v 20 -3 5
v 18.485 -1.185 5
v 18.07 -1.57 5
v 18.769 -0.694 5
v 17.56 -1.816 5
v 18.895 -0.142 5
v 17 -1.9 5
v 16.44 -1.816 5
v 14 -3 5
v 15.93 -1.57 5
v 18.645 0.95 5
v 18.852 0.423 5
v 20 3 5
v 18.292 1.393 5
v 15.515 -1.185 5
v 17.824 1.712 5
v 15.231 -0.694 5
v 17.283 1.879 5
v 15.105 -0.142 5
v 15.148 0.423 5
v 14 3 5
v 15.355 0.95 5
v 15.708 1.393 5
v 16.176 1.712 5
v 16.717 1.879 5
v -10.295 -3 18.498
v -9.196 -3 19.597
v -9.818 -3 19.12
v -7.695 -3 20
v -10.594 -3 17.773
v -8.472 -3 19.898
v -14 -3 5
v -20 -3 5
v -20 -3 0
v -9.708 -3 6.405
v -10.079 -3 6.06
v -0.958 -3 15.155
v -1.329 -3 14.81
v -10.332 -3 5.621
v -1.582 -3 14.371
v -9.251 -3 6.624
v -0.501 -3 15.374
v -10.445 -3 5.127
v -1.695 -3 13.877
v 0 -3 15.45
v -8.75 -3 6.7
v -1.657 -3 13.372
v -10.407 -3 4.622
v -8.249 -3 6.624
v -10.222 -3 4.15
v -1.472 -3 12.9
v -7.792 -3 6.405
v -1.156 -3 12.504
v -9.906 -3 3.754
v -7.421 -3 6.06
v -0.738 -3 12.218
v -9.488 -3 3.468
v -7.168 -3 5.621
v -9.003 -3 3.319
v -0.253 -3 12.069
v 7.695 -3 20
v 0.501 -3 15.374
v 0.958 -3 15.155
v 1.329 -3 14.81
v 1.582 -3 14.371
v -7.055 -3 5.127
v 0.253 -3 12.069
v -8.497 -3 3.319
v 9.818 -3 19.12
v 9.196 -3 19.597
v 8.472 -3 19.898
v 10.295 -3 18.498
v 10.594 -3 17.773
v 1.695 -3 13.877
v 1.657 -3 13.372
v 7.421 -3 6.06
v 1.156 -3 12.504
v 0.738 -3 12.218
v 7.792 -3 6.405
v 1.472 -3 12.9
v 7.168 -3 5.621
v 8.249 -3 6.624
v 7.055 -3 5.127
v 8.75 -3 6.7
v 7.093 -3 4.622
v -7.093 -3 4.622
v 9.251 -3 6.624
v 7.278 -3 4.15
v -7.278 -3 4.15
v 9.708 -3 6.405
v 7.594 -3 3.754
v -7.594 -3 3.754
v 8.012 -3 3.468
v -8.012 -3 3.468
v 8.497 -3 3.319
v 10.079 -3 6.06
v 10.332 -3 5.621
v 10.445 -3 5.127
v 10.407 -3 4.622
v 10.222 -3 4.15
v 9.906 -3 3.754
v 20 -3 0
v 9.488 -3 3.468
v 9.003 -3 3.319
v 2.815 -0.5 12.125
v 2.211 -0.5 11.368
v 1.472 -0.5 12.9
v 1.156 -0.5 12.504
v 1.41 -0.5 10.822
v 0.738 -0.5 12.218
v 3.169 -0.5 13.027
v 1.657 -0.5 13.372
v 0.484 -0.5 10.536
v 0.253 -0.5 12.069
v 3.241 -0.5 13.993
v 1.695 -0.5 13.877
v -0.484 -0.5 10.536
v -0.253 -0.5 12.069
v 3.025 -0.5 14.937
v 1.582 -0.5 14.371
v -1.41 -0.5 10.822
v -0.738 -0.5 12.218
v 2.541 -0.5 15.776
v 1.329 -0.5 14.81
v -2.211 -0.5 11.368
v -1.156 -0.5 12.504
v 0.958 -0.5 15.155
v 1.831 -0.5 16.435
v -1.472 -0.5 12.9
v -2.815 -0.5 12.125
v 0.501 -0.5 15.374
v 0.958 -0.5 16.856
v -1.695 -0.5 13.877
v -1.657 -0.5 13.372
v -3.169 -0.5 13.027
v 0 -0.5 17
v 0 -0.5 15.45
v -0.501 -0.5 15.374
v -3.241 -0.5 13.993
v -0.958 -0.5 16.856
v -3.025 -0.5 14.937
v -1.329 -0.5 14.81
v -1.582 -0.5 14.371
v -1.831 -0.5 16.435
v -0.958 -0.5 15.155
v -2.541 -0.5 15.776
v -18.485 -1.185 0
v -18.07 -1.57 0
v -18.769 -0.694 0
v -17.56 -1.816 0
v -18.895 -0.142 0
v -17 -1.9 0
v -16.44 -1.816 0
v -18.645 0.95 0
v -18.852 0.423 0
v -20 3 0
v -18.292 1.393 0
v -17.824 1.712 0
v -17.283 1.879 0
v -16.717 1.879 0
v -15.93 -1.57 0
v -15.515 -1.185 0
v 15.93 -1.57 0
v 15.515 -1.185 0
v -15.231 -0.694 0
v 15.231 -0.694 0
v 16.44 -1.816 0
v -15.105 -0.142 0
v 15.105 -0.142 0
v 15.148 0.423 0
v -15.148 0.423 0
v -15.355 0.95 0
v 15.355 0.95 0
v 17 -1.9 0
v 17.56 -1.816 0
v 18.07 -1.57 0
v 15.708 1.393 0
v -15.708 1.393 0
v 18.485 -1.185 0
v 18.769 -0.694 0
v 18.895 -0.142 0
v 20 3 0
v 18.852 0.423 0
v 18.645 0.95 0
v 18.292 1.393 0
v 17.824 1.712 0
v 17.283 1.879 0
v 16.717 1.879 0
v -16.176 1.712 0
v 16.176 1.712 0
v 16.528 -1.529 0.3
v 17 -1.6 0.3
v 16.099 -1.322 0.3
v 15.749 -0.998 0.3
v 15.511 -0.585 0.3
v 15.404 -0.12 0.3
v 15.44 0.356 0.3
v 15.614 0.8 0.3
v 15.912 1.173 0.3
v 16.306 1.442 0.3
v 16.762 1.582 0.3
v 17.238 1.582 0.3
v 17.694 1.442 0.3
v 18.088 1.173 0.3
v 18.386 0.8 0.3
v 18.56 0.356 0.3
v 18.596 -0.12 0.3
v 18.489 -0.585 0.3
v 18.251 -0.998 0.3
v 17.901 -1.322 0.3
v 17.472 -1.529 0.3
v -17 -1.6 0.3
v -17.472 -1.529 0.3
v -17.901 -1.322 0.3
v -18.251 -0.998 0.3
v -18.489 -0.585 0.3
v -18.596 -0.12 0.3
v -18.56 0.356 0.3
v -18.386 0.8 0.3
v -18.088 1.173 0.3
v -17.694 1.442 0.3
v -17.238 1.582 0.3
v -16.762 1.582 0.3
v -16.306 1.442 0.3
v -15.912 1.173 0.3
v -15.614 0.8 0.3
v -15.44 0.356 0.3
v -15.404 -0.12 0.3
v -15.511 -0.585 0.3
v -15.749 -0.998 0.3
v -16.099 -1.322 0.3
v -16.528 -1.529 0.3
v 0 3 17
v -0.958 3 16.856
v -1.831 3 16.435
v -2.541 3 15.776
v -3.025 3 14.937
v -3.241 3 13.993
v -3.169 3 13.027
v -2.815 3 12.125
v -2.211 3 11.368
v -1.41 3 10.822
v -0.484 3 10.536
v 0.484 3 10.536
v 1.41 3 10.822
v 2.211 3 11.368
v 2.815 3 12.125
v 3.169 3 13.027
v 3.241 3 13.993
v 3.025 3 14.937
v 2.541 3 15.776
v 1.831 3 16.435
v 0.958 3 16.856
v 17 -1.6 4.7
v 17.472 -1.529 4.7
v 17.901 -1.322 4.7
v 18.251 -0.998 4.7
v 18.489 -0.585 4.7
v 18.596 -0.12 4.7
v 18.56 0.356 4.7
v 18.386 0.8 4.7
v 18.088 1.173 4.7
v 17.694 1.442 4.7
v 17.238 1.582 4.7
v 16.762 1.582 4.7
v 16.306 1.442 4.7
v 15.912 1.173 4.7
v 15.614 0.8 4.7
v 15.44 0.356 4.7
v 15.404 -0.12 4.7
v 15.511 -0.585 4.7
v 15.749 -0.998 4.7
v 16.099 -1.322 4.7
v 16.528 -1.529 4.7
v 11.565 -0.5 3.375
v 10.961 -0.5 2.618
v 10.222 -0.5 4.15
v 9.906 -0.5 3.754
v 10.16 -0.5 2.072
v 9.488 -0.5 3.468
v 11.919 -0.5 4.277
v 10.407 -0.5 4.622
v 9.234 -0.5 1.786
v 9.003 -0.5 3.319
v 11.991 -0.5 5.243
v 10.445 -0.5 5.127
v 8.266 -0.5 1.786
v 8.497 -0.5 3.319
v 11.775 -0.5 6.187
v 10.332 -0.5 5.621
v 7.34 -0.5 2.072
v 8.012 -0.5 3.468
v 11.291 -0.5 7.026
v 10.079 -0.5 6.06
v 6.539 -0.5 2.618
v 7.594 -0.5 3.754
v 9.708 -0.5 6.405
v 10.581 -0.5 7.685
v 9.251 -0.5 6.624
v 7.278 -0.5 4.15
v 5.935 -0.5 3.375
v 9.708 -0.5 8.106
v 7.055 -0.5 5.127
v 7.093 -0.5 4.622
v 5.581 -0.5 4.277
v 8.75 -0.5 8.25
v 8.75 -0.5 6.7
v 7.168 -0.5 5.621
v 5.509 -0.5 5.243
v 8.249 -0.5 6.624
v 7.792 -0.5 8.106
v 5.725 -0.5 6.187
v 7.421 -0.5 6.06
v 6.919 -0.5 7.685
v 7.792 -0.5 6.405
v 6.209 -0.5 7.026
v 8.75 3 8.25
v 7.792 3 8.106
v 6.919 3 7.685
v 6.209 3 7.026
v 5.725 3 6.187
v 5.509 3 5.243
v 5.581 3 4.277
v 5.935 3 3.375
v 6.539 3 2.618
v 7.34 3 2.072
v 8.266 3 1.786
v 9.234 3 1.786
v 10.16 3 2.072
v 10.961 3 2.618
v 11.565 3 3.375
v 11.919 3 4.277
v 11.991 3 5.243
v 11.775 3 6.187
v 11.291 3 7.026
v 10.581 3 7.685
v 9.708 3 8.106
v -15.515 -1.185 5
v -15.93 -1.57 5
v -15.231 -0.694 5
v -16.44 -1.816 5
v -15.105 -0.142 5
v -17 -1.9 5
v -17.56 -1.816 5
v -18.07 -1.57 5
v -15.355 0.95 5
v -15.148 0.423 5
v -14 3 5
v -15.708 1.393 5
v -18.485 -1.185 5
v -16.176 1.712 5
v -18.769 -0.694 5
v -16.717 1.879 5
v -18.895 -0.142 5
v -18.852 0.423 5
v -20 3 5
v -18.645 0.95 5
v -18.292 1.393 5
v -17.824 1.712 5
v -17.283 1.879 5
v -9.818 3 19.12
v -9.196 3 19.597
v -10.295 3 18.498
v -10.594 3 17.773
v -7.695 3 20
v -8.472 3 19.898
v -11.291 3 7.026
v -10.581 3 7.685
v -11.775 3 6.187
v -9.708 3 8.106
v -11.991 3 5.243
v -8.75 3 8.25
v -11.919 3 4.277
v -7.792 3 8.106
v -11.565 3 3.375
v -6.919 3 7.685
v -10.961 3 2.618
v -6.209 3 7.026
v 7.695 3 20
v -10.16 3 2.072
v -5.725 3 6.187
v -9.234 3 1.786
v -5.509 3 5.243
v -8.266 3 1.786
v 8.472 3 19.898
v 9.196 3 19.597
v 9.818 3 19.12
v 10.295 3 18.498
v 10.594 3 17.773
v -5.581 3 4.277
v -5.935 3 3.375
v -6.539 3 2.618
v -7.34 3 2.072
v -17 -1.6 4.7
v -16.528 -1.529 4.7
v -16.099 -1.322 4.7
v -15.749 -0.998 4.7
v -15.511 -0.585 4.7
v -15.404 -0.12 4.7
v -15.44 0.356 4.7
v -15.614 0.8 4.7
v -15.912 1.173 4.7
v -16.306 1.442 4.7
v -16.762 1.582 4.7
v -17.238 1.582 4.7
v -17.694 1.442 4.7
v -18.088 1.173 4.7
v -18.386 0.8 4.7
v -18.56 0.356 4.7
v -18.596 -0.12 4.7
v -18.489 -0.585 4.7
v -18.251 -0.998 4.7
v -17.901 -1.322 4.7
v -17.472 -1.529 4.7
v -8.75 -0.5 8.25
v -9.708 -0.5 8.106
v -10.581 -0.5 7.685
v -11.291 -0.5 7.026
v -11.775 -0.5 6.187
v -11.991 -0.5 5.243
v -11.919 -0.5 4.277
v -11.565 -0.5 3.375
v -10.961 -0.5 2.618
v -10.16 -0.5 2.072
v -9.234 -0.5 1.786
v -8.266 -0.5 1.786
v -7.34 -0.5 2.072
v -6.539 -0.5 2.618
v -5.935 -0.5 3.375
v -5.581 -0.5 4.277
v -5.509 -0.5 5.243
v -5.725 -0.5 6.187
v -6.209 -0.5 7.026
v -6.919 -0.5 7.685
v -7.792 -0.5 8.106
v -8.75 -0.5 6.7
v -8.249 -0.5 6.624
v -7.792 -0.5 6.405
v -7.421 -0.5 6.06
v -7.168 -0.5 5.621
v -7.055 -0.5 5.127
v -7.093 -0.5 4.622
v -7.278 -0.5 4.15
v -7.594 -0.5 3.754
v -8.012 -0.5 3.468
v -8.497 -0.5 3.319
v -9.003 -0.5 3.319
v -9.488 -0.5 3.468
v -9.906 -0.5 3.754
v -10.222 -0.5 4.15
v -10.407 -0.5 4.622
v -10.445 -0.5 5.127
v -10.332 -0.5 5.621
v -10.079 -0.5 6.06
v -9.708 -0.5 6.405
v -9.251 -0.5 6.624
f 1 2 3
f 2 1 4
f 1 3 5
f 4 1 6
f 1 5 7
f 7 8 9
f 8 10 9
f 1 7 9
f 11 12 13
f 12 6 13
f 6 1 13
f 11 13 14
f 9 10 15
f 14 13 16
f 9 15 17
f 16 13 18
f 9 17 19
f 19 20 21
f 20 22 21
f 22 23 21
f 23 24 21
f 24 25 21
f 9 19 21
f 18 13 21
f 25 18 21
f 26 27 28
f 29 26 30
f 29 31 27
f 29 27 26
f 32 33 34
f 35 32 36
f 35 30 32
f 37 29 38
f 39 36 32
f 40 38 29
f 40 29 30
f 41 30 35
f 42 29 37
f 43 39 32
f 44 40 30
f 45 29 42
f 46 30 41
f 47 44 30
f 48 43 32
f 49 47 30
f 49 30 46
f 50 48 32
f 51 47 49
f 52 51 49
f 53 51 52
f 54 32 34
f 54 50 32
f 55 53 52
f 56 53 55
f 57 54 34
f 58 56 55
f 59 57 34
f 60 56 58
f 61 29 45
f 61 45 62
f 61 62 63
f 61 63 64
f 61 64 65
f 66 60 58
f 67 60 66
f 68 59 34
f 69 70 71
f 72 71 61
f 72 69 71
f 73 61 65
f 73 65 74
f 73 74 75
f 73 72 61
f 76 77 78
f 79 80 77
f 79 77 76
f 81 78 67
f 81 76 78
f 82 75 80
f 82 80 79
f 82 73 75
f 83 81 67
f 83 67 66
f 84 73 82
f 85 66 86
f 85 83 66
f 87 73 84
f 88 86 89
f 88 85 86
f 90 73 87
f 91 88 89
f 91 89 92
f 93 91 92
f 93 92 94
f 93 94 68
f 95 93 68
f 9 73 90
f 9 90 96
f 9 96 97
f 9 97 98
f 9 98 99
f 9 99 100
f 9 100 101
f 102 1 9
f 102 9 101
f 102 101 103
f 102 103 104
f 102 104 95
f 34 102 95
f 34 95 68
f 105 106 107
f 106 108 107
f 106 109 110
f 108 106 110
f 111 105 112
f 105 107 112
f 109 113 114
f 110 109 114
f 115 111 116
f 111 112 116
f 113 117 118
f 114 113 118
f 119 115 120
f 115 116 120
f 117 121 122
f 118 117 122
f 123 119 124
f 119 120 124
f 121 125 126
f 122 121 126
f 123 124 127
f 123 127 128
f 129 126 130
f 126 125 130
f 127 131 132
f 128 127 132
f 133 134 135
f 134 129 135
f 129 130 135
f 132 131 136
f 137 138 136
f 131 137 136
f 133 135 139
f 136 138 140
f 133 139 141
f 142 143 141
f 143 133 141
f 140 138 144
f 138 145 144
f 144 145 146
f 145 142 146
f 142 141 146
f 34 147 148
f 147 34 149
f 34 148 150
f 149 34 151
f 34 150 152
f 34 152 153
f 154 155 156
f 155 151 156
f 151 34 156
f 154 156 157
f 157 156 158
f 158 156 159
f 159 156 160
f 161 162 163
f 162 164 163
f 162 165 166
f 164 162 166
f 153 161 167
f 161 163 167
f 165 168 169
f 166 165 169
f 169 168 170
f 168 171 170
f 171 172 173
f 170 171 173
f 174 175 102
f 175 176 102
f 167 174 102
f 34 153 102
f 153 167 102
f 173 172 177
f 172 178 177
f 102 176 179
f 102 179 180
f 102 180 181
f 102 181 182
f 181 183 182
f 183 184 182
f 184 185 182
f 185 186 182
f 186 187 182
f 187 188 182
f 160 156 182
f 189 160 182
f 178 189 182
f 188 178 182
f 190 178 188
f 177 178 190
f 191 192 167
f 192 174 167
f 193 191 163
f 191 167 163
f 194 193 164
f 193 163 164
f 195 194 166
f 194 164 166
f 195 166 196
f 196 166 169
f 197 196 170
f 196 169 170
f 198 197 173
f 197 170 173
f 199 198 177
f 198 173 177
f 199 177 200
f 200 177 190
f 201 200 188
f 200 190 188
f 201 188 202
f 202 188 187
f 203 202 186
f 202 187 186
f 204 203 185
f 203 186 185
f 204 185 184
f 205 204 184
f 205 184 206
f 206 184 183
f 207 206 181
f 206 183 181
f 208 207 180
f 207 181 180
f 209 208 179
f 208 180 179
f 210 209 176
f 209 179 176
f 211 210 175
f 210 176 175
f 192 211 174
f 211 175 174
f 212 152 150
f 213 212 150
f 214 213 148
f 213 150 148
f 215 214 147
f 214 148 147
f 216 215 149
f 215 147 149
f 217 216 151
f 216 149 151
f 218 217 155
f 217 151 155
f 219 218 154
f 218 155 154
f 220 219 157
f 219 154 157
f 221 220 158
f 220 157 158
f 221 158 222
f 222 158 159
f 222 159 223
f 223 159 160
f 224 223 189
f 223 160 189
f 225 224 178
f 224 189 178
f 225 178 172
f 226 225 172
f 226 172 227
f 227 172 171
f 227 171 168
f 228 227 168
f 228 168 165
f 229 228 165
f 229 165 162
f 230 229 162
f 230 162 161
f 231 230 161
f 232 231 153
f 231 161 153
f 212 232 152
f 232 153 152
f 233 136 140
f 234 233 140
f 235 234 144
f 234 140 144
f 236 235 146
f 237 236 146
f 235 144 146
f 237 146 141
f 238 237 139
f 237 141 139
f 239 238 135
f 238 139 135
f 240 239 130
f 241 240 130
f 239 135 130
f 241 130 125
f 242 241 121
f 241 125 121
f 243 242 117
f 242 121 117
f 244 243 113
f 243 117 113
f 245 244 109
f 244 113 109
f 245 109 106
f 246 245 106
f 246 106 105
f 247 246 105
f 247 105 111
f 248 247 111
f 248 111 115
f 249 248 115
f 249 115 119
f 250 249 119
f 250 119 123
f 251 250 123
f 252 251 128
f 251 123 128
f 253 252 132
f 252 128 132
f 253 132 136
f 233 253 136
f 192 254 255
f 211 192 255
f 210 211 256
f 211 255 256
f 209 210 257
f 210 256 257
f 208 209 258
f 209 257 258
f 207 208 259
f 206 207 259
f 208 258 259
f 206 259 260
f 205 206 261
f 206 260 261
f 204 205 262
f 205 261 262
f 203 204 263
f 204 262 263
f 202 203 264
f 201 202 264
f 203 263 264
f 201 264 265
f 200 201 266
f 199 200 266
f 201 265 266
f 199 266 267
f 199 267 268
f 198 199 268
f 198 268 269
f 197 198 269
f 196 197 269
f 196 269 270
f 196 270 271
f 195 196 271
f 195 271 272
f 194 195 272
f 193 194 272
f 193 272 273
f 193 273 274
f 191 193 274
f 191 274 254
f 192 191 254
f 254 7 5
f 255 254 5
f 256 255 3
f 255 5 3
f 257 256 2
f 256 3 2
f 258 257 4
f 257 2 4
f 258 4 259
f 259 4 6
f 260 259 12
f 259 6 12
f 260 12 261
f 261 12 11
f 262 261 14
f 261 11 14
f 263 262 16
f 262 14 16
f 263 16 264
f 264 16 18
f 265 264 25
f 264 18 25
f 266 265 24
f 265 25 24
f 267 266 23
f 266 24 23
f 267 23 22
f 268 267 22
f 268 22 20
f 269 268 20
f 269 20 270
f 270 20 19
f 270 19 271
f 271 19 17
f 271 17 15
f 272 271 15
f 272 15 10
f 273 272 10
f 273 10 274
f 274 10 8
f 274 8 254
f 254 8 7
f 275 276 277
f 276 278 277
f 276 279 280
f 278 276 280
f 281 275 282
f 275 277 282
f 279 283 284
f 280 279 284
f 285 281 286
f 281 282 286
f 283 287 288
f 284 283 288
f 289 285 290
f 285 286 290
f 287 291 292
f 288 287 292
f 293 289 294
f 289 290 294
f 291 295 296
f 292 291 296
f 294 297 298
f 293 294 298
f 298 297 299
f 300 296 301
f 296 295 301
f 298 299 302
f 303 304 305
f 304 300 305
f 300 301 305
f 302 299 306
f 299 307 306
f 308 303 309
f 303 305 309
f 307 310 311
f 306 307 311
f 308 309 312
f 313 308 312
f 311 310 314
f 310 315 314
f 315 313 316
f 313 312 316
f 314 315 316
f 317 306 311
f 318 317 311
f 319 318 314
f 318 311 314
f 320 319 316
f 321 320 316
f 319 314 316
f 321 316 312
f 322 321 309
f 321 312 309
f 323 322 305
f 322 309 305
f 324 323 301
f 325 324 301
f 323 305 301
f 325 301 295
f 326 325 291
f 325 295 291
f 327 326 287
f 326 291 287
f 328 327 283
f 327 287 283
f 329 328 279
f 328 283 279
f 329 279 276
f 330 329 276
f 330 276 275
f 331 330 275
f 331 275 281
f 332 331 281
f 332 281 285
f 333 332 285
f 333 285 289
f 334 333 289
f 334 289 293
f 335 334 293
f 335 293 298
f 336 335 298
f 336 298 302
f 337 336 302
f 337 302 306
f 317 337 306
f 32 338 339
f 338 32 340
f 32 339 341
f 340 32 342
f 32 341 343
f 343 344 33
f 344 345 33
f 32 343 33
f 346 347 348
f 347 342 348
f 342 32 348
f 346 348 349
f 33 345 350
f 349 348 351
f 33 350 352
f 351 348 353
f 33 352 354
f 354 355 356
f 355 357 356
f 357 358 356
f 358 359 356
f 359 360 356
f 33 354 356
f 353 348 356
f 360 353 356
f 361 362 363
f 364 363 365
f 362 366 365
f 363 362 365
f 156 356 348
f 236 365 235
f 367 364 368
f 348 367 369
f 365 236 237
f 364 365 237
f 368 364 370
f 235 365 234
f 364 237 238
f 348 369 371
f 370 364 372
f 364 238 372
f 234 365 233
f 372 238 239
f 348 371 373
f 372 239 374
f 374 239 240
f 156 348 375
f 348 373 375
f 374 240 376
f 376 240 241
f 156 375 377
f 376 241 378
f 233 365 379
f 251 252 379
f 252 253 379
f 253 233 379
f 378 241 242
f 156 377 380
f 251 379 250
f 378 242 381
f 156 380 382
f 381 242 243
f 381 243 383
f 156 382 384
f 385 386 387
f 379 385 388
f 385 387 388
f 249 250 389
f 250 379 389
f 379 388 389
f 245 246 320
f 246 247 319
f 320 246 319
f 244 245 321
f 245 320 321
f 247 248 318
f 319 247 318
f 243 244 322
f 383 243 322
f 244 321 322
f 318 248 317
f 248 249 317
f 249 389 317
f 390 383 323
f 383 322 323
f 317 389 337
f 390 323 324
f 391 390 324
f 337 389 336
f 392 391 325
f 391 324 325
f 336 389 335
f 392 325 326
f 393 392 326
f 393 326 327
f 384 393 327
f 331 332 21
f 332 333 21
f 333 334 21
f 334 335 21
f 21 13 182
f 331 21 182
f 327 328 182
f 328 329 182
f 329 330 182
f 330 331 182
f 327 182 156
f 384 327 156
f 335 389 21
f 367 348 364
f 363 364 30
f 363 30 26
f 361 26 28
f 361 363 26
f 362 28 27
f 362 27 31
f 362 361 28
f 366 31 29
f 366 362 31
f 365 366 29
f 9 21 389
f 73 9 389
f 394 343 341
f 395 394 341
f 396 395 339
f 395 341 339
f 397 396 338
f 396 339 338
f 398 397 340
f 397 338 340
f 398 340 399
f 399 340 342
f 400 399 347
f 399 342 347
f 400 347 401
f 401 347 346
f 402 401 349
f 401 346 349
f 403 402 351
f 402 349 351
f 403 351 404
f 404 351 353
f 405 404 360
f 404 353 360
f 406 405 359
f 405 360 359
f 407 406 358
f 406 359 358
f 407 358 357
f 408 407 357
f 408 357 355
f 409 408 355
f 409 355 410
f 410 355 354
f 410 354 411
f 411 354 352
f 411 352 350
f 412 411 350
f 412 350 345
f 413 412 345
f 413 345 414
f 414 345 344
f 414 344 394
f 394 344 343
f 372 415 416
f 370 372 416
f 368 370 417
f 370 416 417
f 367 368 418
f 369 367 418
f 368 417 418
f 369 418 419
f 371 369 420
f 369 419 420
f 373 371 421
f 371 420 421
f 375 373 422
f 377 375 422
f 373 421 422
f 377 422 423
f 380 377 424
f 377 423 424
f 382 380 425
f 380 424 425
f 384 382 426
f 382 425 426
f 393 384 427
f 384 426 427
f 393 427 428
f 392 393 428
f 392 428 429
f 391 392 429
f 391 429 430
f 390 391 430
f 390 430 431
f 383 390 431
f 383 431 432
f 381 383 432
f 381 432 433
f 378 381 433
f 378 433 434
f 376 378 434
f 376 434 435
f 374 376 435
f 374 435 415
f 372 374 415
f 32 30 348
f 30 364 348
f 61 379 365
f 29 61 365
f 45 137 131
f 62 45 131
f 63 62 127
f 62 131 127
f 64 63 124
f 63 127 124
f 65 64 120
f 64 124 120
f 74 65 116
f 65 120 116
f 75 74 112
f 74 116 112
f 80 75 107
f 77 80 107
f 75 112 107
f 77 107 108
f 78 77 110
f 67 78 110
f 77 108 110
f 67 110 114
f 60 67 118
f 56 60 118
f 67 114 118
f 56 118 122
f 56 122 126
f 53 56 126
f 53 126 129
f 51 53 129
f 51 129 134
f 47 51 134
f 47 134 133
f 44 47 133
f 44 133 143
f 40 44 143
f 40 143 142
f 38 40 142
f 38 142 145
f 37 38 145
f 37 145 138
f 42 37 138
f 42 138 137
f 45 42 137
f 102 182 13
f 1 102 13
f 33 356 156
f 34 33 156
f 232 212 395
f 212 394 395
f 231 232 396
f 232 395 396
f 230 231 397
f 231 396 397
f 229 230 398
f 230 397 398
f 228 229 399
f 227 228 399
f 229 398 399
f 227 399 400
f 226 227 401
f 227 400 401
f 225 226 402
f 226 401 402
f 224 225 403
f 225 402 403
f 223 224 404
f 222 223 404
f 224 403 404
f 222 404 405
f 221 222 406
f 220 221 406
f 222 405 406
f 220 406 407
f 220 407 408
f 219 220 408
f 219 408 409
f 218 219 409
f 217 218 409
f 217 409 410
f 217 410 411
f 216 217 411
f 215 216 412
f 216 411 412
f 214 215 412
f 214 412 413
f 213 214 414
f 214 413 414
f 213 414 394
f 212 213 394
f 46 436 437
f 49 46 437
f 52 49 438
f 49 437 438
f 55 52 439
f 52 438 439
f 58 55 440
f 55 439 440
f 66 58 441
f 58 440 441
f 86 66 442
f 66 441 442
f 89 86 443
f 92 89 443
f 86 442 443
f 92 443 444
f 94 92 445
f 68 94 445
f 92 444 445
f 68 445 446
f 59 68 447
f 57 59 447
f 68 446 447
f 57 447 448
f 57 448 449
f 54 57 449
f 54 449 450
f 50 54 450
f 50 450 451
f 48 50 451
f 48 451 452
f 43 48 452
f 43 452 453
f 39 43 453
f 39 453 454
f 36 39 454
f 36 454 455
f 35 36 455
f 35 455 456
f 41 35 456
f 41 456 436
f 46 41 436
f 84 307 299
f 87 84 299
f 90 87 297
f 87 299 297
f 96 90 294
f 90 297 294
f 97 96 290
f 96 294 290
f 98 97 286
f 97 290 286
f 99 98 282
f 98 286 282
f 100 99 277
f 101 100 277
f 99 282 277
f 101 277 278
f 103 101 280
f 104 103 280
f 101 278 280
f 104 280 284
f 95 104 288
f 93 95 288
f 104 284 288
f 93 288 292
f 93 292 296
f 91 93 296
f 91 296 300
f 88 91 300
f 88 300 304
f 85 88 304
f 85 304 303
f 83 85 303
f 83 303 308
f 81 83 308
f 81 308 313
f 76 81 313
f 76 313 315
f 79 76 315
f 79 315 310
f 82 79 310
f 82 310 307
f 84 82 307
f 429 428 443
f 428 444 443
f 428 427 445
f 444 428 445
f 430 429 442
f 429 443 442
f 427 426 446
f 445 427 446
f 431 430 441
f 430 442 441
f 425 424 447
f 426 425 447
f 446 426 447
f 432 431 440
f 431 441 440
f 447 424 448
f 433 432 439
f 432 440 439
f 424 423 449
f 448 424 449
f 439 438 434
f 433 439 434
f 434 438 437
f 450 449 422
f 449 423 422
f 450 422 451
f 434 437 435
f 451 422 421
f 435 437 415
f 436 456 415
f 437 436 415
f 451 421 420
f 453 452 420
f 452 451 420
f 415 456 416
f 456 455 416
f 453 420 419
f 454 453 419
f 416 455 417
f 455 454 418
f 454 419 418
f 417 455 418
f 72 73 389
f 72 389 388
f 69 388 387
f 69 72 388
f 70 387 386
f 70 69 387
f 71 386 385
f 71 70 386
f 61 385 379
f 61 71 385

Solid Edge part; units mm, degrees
sketch "Sketch1" plane through (0, 0, 0) normal (0, -1, 0) x (1, 0, 0)
  line L0 (-20, 5) -> (-20, 0)
  line L1 (-20, 0) -> (20, 0)
  line L2 (20, 0) -> (20, 5)
  line L3 (20, 5) -> (14, 5)
  line L4 (14, 5) -> (10, 20)
  line L5 (10, 20) -> (-10, 20)
  line L6 (-10, 20) -> (-14, 5)
  line L7 (-14, 5) -> (-20, 5)
  dimension "D1" = 20
  dimension "D2" = 40
  dimension "D3" = 28
  dimension "D4" = 5
  dimension "D5" = 15
extrude "Protrusion1" add sketch "Sketch1" along normal mid plane 6
fillet "rounds" radius 3 2 edges at (10, 0, 20) (-10, 0, 20)
hole "Hole1" at (0, 3, 13.75) direction (0, -1, 0) diameter 3.4 end up to next counterbore diameter 6.5 counterbore depth 3.5
hole "Hole2" at (8.75, 3, 5) direction (0, -1, 0) diameter 3.4 end up to next counterbore diameter 6.5 counterbore depth 3.5
hole "Hole3" at (-8.75, 3, 5) direction (0, -1, 0) diameter 3.4 end up to next counterbore diameter 6.5 counterbore depth 3.5
hole "Hole4" at (-17, 0, 5) direction (0, 0, -1) diameter 3.2 end up to next start chamfer 0.3 start chamfer angle 45 end chamfer 0.3 end chamfer angle 45
hole "Hole5" at (17, 0, 5) direction (0, 0, -1) diameter 3.2 end up to next start chamfer 0.3 start chamfer angle 45 end chamfer 0.3 end chamfer angle 45
properties material "Polyethylene, low density"
